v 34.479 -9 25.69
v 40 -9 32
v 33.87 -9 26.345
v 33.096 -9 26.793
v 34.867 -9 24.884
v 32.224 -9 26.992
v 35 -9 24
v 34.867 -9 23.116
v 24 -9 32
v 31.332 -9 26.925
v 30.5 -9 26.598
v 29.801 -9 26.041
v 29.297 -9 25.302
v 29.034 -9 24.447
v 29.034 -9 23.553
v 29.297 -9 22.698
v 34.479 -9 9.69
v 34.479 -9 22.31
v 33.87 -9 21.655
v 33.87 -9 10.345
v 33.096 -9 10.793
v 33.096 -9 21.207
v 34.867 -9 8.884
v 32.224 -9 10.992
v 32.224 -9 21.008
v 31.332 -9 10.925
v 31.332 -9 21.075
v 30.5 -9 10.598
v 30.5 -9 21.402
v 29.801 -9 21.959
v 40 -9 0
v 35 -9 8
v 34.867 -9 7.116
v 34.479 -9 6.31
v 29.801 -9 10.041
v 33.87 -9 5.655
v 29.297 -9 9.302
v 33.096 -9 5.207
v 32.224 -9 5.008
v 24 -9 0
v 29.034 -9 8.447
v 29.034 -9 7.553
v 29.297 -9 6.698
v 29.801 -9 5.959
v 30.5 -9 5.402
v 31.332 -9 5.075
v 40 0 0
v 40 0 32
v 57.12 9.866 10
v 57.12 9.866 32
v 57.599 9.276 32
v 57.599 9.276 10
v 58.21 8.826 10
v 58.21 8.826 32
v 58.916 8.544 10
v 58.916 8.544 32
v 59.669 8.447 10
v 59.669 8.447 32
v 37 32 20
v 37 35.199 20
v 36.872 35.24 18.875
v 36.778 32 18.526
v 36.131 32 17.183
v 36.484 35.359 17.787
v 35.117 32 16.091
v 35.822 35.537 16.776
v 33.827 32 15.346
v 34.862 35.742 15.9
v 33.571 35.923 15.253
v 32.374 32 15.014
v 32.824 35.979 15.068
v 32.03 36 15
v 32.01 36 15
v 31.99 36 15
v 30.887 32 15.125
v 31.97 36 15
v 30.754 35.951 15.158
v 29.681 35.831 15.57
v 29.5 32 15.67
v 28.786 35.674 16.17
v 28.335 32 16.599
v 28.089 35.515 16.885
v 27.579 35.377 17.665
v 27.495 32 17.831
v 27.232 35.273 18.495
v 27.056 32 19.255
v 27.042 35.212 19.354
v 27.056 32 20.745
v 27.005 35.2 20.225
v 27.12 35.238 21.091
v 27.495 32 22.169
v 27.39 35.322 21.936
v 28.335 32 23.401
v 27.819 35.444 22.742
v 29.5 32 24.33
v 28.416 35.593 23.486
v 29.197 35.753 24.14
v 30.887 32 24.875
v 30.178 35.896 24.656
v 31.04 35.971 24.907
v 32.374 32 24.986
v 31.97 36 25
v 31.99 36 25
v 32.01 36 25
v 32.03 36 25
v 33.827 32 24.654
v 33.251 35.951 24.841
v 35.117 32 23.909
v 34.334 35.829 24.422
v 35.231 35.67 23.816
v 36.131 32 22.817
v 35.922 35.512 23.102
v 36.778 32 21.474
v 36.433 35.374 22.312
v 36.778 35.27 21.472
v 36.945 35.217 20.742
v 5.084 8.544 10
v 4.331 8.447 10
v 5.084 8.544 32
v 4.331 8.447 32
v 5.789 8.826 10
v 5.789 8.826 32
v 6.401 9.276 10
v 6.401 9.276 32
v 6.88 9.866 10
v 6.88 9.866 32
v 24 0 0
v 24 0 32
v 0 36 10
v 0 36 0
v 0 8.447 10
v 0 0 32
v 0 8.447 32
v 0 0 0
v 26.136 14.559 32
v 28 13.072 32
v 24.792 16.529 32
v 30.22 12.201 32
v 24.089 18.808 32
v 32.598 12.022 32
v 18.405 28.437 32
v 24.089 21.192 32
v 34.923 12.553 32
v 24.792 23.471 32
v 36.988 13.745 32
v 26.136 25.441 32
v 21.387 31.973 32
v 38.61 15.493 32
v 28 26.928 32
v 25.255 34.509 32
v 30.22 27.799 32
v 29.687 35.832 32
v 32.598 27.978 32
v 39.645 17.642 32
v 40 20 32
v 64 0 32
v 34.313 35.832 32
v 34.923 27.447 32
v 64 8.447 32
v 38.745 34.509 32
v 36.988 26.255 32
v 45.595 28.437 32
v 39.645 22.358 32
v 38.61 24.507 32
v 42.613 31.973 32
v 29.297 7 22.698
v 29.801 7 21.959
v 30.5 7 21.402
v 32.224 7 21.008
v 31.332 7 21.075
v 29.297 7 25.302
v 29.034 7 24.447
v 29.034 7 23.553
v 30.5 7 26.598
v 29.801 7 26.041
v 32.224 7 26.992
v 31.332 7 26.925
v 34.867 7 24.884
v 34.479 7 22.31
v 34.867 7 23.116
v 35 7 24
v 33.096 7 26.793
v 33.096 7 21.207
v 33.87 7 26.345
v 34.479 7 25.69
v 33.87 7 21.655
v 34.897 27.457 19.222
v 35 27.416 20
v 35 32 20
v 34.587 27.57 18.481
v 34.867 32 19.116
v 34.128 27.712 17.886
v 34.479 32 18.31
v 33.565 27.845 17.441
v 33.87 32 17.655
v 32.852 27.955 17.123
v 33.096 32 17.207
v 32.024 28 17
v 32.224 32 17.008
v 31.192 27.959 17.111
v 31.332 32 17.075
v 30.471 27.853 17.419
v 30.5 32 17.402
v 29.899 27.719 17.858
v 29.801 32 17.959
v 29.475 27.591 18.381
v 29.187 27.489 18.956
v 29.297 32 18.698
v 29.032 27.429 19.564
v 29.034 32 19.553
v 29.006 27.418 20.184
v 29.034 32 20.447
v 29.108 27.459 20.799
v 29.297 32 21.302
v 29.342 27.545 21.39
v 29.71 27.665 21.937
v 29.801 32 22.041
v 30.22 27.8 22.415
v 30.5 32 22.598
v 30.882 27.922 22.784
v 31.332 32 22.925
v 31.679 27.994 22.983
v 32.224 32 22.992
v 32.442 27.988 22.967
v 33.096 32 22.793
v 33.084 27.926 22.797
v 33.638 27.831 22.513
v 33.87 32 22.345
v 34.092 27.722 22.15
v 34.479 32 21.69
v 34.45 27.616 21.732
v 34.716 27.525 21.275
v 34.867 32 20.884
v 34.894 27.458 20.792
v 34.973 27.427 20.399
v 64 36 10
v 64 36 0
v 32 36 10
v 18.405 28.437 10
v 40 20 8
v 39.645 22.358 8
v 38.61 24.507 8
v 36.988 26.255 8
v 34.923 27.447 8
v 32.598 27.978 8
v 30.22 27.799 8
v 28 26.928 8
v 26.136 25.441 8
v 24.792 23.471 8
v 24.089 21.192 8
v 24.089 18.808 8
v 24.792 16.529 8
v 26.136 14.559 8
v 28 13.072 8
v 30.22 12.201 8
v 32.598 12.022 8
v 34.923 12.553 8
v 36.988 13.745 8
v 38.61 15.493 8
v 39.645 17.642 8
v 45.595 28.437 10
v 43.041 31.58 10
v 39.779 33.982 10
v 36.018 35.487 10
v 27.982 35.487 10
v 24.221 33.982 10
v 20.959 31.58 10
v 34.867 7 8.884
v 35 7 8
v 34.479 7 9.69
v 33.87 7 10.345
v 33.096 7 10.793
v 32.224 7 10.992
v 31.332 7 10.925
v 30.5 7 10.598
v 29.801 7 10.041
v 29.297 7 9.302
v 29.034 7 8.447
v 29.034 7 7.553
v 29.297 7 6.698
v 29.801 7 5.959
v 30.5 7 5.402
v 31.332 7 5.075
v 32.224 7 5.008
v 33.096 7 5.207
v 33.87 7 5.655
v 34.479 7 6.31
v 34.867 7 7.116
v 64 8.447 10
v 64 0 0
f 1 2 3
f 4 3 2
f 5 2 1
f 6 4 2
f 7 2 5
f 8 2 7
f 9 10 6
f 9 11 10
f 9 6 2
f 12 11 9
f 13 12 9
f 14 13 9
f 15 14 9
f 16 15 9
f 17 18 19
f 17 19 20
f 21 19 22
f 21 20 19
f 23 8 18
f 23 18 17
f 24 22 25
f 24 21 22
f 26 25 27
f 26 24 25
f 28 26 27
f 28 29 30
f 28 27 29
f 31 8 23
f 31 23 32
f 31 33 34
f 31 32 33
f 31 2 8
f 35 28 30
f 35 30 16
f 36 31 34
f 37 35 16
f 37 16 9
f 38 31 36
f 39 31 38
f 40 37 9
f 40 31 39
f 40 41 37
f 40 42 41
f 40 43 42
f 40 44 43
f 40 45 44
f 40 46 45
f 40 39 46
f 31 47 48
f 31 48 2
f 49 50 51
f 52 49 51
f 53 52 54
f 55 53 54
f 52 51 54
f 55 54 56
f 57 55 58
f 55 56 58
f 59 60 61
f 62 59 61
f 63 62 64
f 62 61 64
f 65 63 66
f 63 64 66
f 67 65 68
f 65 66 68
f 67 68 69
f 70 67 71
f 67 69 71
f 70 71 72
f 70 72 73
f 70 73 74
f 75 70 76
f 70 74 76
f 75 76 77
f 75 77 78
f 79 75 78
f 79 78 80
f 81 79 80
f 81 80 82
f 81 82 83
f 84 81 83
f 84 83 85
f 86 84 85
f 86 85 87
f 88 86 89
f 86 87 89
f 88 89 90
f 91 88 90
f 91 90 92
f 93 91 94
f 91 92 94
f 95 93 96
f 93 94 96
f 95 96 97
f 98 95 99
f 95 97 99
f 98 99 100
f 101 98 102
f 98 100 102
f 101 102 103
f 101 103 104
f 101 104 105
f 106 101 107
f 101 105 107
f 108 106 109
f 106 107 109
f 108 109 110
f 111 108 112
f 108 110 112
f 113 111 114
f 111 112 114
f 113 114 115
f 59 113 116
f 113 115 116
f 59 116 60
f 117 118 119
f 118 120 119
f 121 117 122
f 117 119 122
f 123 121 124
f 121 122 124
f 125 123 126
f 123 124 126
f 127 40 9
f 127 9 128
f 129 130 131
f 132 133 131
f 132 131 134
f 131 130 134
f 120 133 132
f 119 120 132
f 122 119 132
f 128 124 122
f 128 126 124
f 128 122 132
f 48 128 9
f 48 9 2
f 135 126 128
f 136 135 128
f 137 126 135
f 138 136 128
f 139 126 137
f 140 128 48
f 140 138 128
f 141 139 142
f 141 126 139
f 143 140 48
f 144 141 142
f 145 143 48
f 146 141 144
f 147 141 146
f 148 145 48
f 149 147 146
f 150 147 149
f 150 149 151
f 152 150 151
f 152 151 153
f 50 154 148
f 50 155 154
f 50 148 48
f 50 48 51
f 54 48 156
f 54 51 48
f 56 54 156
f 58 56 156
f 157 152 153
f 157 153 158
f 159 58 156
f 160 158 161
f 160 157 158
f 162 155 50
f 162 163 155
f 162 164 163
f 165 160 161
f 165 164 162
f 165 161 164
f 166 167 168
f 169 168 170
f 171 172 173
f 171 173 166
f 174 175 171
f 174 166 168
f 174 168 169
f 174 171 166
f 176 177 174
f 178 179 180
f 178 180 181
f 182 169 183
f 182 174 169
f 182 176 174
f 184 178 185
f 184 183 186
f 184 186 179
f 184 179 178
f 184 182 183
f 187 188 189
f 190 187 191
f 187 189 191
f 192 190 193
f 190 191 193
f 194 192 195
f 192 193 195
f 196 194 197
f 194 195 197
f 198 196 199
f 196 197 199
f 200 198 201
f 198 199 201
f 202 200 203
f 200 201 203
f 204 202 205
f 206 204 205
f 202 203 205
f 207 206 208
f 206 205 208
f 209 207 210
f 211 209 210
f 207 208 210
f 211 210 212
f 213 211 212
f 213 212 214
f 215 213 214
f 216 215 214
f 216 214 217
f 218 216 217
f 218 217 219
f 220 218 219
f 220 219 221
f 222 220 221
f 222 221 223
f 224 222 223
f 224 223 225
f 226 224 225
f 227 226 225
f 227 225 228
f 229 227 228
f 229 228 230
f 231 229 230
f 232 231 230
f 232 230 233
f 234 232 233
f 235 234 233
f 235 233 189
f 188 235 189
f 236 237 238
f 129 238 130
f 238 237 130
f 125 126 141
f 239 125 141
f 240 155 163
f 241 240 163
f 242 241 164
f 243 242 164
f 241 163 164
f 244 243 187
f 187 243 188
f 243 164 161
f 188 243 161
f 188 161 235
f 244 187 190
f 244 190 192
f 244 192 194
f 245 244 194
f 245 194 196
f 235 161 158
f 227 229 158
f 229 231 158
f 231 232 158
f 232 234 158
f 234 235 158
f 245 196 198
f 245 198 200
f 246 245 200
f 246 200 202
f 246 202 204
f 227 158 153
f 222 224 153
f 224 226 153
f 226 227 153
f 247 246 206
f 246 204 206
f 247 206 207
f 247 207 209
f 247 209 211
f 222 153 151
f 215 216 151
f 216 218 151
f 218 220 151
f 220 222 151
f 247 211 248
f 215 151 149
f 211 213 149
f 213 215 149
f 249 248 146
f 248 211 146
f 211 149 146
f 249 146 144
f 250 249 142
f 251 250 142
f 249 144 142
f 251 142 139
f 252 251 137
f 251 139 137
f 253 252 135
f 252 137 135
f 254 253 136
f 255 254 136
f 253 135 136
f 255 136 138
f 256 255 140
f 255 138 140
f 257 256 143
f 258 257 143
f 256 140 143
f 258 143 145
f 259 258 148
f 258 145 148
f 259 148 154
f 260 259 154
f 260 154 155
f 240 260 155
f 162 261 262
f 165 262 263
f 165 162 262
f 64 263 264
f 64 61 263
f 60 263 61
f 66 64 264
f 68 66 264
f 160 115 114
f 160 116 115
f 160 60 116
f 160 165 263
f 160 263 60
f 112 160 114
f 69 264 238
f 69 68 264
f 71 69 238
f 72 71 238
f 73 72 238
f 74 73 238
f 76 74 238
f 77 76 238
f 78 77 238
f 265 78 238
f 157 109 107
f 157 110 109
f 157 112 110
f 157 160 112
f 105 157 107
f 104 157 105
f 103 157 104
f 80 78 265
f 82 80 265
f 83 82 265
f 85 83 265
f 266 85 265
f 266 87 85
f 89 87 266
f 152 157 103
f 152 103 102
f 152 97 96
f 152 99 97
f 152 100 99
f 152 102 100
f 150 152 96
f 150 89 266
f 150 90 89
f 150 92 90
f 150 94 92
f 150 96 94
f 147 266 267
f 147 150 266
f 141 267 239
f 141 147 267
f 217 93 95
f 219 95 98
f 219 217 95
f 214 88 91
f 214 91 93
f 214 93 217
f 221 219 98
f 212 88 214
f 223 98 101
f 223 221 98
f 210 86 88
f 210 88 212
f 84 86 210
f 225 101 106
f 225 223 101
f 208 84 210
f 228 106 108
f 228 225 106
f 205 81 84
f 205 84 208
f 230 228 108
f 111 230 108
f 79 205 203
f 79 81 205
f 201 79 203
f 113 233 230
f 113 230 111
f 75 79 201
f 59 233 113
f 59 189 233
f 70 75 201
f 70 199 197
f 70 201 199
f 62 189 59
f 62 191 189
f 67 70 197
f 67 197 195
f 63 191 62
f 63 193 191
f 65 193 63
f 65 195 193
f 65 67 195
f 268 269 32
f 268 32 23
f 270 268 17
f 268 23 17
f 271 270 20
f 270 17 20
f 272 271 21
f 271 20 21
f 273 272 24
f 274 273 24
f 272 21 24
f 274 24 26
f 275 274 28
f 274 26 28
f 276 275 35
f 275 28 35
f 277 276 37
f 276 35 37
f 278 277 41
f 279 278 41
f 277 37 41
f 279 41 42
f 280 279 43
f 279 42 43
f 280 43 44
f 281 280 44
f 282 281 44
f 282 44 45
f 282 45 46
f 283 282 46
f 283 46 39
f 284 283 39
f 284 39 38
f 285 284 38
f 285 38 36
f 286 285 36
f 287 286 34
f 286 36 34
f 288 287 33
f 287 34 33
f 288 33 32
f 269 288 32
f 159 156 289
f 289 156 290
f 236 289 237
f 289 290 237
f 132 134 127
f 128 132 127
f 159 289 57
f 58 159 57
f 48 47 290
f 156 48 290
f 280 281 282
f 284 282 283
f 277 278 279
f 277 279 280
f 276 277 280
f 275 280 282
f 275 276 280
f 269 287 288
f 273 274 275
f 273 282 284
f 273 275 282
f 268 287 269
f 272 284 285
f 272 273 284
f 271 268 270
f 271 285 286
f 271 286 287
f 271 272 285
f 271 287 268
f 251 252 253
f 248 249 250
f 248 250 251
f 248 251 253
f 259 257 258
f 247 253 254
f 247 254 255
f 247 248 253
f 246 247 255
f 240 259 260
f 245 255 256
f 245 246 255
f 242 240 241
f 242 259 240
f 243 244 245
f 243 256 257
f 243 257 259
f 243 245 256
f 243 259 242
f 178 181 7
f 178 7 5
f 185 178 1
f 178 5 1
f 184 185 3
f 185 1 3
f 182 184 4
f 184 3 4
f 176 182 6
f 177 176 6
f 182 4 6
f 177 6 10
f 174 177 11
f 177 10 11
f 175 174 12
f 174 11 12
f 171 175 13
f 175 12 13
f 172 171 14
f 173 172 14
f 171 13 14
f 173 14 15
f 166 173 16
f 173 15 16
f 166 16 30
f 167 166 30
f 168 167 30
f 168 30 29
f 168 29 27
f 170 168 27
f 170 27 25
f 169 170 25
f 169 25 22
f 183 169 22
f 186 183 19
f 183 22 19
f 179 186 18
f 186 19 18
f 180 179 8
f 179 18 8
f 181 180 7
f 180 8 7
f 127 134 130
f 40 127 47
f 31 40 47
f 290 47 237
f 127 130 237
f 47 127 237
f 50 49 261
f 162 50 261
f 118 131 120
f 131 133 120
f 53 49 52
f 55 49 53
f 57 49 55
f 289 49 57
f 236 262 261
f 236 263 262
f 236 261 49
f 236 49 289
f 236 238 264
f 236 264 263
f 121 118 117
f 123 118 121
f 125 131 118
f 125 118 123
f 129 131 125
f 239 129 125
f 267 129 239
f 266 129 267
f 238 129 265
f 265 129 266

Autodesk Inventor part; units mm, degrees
ref_plane "YZ Plane" through (0, 0, 0) normal (1, 0, 0) x (0, 1, 0)
ref_plane "XZ Plane" through (0, 0, 0) normal (0, 1, 0) x (-1, 0, 0)
ref_plane "XY Plane" through (0, 0, 0) normal (0, 0, 1) x (1, 0, 0)
sketch "Sketch1" plane through (0, 0, 0) normal (0, 0, 1) x (1, 0, 0)
  line L0 (64, 0) -> (64, 36)
  line L1 (64, 36) -> (0, 36)
  line L2 (0, 36) -> (0, 0)
  line L3 (40, 0) -> (40, -9)
  line L4 (40, -9) -> (24, -9)
  line L5 (24, -9) -> (24, 0)
  line L6 (0, 0) -> (24, 0)
  line L7 (40, 0) -> (64, 0)
  dimension "d0" = 64
  dimension "d1" = 36
  dimension "d2" = 16
  dimension "d3" = 9
  dimension "d4" = 24
extrude "Extrusion1" add sketch "Sketch1" along normal blind 32
sketch "Sketch2" plane through (0, 0, 32) normal (0, 0, 1) x (1, 0, 0)
  circle A0 centre (32, 20) radius 6
  line L0 (0, 36) -> (0, 0) projected
  line L1 (40, 0) -> (64, 0) projected
  arc A1 (45.5949, 28.4368) -> (18.4051, 28.4368) centre (32, 20) ccw
  line L2 (0, 8.4474) -> (4.331, 8.4474)
  line L3 (6.8801, 9.8655) -> (18.4051, 28.4368)
  line L4 (64, 0) -> (64, 36) projected
  line L5 (64, 8.4474) -> (59.669, 8.4474)
  line L6 (57.1199, 9.8655) -> (45.5949, 28.4368)
  arc A2 (4.331, 8.4474) -> (6.8801, 9.8655) centre (4.331, 11.4474) ccw
  arc A3 (57.1199, 9.8655) -> (59.669, 8.4474) centre (59.669, 11.4474) ccw
  line L7 (0, 8.4474) -> (0, 36)
  line L8 (64, 36) -> (0, 36) projected
  line L9 (0, 36) -> (64, 36)
  line L10 (64, 36) -> (64, 8.4474)
  point P0 (6, 8.4474)
  point P1 (58, 8.4474)
  point P2 (32, 36)
  dimension "d7" = 12
  dimension "d8" = 32
  dimension "d9" = 20
  dimension "d10" = 6
  dimension "d11" = 32
  dimension "d12" = 6
  dimension "d13" = 3
extrude "Extrusion2" cut sketch "Sketch2" against normal blind 22 contours L8 A1 L3 A2 L2 L0 | L8 L4 L5 A3 L6 A1
sketch "Sketch3" plane through (0, 0, 32) normal (0, 0, 1) x (1, 0, 0)
  circle A0 centre (32, 20) radius 8
  line L0 (0, 8.4474) -> (0, 36) projected
  line L1 (40, 0) -> (64, 0) projected
  point P0 (0, 0)
  dimension "d16" = 16
  dimension "d17" = 32
  dimension "d18" = 20
extrude "Extrusion3" cut sketch "Sketch3" against normal blind 24
sketch "Sketch4" plane through (0, 36, 0) normal (0, 1, 0) x (1, 0, 0)
  circle A0 centre (32, -20) radius 3
  line L0 (18.4051, -32) -> (45.5949, -32) projected
  line L1 (0, -32) -> (0, -10) projected
  point P0 (0, 0)
  dimension "d21" = 6
  dimension "d22" = 12
  dimension "d23" = 32
extrude "Extrusion4" cut sketch "Sketch4" against normal blind 16
sketch "Sketch5" plane through (0, 36, 0) normal (0, 1, 0) x (1, 0, 0)
  circle A0 centre (32, -20) radius 5
  line L0 (18.4051, -32) -> (45.5949, -32) projected
  line L1 (0, -32) -> (0, -10) projected
  point P0 (0, 0)
  dimension "d26" = 10
  dimension "d27" = 12
  dimension "d28" = 32
extrude "Extrusion5" cut sketch "Sketch5" against normal blind 4
sketch "Sketch6" plane through (24, -9, 0) normal (0, -1, 0) x (1, 0, 0)
  circle A0 centre (8, 24) radius 3
  circle A1 centre (8, 8) radius 3
  line L0 (0, 32) -> (16, 32) projected
  point P0 (-24, 0)
  dimension "d31" = 6
  dimension "d32" = 6
  dimension "d33" = 8
  dimension "d34" = 16
extrude "Extrusion6" cut sketch "Sketch6" against normal blind 16
properties part number "third"
